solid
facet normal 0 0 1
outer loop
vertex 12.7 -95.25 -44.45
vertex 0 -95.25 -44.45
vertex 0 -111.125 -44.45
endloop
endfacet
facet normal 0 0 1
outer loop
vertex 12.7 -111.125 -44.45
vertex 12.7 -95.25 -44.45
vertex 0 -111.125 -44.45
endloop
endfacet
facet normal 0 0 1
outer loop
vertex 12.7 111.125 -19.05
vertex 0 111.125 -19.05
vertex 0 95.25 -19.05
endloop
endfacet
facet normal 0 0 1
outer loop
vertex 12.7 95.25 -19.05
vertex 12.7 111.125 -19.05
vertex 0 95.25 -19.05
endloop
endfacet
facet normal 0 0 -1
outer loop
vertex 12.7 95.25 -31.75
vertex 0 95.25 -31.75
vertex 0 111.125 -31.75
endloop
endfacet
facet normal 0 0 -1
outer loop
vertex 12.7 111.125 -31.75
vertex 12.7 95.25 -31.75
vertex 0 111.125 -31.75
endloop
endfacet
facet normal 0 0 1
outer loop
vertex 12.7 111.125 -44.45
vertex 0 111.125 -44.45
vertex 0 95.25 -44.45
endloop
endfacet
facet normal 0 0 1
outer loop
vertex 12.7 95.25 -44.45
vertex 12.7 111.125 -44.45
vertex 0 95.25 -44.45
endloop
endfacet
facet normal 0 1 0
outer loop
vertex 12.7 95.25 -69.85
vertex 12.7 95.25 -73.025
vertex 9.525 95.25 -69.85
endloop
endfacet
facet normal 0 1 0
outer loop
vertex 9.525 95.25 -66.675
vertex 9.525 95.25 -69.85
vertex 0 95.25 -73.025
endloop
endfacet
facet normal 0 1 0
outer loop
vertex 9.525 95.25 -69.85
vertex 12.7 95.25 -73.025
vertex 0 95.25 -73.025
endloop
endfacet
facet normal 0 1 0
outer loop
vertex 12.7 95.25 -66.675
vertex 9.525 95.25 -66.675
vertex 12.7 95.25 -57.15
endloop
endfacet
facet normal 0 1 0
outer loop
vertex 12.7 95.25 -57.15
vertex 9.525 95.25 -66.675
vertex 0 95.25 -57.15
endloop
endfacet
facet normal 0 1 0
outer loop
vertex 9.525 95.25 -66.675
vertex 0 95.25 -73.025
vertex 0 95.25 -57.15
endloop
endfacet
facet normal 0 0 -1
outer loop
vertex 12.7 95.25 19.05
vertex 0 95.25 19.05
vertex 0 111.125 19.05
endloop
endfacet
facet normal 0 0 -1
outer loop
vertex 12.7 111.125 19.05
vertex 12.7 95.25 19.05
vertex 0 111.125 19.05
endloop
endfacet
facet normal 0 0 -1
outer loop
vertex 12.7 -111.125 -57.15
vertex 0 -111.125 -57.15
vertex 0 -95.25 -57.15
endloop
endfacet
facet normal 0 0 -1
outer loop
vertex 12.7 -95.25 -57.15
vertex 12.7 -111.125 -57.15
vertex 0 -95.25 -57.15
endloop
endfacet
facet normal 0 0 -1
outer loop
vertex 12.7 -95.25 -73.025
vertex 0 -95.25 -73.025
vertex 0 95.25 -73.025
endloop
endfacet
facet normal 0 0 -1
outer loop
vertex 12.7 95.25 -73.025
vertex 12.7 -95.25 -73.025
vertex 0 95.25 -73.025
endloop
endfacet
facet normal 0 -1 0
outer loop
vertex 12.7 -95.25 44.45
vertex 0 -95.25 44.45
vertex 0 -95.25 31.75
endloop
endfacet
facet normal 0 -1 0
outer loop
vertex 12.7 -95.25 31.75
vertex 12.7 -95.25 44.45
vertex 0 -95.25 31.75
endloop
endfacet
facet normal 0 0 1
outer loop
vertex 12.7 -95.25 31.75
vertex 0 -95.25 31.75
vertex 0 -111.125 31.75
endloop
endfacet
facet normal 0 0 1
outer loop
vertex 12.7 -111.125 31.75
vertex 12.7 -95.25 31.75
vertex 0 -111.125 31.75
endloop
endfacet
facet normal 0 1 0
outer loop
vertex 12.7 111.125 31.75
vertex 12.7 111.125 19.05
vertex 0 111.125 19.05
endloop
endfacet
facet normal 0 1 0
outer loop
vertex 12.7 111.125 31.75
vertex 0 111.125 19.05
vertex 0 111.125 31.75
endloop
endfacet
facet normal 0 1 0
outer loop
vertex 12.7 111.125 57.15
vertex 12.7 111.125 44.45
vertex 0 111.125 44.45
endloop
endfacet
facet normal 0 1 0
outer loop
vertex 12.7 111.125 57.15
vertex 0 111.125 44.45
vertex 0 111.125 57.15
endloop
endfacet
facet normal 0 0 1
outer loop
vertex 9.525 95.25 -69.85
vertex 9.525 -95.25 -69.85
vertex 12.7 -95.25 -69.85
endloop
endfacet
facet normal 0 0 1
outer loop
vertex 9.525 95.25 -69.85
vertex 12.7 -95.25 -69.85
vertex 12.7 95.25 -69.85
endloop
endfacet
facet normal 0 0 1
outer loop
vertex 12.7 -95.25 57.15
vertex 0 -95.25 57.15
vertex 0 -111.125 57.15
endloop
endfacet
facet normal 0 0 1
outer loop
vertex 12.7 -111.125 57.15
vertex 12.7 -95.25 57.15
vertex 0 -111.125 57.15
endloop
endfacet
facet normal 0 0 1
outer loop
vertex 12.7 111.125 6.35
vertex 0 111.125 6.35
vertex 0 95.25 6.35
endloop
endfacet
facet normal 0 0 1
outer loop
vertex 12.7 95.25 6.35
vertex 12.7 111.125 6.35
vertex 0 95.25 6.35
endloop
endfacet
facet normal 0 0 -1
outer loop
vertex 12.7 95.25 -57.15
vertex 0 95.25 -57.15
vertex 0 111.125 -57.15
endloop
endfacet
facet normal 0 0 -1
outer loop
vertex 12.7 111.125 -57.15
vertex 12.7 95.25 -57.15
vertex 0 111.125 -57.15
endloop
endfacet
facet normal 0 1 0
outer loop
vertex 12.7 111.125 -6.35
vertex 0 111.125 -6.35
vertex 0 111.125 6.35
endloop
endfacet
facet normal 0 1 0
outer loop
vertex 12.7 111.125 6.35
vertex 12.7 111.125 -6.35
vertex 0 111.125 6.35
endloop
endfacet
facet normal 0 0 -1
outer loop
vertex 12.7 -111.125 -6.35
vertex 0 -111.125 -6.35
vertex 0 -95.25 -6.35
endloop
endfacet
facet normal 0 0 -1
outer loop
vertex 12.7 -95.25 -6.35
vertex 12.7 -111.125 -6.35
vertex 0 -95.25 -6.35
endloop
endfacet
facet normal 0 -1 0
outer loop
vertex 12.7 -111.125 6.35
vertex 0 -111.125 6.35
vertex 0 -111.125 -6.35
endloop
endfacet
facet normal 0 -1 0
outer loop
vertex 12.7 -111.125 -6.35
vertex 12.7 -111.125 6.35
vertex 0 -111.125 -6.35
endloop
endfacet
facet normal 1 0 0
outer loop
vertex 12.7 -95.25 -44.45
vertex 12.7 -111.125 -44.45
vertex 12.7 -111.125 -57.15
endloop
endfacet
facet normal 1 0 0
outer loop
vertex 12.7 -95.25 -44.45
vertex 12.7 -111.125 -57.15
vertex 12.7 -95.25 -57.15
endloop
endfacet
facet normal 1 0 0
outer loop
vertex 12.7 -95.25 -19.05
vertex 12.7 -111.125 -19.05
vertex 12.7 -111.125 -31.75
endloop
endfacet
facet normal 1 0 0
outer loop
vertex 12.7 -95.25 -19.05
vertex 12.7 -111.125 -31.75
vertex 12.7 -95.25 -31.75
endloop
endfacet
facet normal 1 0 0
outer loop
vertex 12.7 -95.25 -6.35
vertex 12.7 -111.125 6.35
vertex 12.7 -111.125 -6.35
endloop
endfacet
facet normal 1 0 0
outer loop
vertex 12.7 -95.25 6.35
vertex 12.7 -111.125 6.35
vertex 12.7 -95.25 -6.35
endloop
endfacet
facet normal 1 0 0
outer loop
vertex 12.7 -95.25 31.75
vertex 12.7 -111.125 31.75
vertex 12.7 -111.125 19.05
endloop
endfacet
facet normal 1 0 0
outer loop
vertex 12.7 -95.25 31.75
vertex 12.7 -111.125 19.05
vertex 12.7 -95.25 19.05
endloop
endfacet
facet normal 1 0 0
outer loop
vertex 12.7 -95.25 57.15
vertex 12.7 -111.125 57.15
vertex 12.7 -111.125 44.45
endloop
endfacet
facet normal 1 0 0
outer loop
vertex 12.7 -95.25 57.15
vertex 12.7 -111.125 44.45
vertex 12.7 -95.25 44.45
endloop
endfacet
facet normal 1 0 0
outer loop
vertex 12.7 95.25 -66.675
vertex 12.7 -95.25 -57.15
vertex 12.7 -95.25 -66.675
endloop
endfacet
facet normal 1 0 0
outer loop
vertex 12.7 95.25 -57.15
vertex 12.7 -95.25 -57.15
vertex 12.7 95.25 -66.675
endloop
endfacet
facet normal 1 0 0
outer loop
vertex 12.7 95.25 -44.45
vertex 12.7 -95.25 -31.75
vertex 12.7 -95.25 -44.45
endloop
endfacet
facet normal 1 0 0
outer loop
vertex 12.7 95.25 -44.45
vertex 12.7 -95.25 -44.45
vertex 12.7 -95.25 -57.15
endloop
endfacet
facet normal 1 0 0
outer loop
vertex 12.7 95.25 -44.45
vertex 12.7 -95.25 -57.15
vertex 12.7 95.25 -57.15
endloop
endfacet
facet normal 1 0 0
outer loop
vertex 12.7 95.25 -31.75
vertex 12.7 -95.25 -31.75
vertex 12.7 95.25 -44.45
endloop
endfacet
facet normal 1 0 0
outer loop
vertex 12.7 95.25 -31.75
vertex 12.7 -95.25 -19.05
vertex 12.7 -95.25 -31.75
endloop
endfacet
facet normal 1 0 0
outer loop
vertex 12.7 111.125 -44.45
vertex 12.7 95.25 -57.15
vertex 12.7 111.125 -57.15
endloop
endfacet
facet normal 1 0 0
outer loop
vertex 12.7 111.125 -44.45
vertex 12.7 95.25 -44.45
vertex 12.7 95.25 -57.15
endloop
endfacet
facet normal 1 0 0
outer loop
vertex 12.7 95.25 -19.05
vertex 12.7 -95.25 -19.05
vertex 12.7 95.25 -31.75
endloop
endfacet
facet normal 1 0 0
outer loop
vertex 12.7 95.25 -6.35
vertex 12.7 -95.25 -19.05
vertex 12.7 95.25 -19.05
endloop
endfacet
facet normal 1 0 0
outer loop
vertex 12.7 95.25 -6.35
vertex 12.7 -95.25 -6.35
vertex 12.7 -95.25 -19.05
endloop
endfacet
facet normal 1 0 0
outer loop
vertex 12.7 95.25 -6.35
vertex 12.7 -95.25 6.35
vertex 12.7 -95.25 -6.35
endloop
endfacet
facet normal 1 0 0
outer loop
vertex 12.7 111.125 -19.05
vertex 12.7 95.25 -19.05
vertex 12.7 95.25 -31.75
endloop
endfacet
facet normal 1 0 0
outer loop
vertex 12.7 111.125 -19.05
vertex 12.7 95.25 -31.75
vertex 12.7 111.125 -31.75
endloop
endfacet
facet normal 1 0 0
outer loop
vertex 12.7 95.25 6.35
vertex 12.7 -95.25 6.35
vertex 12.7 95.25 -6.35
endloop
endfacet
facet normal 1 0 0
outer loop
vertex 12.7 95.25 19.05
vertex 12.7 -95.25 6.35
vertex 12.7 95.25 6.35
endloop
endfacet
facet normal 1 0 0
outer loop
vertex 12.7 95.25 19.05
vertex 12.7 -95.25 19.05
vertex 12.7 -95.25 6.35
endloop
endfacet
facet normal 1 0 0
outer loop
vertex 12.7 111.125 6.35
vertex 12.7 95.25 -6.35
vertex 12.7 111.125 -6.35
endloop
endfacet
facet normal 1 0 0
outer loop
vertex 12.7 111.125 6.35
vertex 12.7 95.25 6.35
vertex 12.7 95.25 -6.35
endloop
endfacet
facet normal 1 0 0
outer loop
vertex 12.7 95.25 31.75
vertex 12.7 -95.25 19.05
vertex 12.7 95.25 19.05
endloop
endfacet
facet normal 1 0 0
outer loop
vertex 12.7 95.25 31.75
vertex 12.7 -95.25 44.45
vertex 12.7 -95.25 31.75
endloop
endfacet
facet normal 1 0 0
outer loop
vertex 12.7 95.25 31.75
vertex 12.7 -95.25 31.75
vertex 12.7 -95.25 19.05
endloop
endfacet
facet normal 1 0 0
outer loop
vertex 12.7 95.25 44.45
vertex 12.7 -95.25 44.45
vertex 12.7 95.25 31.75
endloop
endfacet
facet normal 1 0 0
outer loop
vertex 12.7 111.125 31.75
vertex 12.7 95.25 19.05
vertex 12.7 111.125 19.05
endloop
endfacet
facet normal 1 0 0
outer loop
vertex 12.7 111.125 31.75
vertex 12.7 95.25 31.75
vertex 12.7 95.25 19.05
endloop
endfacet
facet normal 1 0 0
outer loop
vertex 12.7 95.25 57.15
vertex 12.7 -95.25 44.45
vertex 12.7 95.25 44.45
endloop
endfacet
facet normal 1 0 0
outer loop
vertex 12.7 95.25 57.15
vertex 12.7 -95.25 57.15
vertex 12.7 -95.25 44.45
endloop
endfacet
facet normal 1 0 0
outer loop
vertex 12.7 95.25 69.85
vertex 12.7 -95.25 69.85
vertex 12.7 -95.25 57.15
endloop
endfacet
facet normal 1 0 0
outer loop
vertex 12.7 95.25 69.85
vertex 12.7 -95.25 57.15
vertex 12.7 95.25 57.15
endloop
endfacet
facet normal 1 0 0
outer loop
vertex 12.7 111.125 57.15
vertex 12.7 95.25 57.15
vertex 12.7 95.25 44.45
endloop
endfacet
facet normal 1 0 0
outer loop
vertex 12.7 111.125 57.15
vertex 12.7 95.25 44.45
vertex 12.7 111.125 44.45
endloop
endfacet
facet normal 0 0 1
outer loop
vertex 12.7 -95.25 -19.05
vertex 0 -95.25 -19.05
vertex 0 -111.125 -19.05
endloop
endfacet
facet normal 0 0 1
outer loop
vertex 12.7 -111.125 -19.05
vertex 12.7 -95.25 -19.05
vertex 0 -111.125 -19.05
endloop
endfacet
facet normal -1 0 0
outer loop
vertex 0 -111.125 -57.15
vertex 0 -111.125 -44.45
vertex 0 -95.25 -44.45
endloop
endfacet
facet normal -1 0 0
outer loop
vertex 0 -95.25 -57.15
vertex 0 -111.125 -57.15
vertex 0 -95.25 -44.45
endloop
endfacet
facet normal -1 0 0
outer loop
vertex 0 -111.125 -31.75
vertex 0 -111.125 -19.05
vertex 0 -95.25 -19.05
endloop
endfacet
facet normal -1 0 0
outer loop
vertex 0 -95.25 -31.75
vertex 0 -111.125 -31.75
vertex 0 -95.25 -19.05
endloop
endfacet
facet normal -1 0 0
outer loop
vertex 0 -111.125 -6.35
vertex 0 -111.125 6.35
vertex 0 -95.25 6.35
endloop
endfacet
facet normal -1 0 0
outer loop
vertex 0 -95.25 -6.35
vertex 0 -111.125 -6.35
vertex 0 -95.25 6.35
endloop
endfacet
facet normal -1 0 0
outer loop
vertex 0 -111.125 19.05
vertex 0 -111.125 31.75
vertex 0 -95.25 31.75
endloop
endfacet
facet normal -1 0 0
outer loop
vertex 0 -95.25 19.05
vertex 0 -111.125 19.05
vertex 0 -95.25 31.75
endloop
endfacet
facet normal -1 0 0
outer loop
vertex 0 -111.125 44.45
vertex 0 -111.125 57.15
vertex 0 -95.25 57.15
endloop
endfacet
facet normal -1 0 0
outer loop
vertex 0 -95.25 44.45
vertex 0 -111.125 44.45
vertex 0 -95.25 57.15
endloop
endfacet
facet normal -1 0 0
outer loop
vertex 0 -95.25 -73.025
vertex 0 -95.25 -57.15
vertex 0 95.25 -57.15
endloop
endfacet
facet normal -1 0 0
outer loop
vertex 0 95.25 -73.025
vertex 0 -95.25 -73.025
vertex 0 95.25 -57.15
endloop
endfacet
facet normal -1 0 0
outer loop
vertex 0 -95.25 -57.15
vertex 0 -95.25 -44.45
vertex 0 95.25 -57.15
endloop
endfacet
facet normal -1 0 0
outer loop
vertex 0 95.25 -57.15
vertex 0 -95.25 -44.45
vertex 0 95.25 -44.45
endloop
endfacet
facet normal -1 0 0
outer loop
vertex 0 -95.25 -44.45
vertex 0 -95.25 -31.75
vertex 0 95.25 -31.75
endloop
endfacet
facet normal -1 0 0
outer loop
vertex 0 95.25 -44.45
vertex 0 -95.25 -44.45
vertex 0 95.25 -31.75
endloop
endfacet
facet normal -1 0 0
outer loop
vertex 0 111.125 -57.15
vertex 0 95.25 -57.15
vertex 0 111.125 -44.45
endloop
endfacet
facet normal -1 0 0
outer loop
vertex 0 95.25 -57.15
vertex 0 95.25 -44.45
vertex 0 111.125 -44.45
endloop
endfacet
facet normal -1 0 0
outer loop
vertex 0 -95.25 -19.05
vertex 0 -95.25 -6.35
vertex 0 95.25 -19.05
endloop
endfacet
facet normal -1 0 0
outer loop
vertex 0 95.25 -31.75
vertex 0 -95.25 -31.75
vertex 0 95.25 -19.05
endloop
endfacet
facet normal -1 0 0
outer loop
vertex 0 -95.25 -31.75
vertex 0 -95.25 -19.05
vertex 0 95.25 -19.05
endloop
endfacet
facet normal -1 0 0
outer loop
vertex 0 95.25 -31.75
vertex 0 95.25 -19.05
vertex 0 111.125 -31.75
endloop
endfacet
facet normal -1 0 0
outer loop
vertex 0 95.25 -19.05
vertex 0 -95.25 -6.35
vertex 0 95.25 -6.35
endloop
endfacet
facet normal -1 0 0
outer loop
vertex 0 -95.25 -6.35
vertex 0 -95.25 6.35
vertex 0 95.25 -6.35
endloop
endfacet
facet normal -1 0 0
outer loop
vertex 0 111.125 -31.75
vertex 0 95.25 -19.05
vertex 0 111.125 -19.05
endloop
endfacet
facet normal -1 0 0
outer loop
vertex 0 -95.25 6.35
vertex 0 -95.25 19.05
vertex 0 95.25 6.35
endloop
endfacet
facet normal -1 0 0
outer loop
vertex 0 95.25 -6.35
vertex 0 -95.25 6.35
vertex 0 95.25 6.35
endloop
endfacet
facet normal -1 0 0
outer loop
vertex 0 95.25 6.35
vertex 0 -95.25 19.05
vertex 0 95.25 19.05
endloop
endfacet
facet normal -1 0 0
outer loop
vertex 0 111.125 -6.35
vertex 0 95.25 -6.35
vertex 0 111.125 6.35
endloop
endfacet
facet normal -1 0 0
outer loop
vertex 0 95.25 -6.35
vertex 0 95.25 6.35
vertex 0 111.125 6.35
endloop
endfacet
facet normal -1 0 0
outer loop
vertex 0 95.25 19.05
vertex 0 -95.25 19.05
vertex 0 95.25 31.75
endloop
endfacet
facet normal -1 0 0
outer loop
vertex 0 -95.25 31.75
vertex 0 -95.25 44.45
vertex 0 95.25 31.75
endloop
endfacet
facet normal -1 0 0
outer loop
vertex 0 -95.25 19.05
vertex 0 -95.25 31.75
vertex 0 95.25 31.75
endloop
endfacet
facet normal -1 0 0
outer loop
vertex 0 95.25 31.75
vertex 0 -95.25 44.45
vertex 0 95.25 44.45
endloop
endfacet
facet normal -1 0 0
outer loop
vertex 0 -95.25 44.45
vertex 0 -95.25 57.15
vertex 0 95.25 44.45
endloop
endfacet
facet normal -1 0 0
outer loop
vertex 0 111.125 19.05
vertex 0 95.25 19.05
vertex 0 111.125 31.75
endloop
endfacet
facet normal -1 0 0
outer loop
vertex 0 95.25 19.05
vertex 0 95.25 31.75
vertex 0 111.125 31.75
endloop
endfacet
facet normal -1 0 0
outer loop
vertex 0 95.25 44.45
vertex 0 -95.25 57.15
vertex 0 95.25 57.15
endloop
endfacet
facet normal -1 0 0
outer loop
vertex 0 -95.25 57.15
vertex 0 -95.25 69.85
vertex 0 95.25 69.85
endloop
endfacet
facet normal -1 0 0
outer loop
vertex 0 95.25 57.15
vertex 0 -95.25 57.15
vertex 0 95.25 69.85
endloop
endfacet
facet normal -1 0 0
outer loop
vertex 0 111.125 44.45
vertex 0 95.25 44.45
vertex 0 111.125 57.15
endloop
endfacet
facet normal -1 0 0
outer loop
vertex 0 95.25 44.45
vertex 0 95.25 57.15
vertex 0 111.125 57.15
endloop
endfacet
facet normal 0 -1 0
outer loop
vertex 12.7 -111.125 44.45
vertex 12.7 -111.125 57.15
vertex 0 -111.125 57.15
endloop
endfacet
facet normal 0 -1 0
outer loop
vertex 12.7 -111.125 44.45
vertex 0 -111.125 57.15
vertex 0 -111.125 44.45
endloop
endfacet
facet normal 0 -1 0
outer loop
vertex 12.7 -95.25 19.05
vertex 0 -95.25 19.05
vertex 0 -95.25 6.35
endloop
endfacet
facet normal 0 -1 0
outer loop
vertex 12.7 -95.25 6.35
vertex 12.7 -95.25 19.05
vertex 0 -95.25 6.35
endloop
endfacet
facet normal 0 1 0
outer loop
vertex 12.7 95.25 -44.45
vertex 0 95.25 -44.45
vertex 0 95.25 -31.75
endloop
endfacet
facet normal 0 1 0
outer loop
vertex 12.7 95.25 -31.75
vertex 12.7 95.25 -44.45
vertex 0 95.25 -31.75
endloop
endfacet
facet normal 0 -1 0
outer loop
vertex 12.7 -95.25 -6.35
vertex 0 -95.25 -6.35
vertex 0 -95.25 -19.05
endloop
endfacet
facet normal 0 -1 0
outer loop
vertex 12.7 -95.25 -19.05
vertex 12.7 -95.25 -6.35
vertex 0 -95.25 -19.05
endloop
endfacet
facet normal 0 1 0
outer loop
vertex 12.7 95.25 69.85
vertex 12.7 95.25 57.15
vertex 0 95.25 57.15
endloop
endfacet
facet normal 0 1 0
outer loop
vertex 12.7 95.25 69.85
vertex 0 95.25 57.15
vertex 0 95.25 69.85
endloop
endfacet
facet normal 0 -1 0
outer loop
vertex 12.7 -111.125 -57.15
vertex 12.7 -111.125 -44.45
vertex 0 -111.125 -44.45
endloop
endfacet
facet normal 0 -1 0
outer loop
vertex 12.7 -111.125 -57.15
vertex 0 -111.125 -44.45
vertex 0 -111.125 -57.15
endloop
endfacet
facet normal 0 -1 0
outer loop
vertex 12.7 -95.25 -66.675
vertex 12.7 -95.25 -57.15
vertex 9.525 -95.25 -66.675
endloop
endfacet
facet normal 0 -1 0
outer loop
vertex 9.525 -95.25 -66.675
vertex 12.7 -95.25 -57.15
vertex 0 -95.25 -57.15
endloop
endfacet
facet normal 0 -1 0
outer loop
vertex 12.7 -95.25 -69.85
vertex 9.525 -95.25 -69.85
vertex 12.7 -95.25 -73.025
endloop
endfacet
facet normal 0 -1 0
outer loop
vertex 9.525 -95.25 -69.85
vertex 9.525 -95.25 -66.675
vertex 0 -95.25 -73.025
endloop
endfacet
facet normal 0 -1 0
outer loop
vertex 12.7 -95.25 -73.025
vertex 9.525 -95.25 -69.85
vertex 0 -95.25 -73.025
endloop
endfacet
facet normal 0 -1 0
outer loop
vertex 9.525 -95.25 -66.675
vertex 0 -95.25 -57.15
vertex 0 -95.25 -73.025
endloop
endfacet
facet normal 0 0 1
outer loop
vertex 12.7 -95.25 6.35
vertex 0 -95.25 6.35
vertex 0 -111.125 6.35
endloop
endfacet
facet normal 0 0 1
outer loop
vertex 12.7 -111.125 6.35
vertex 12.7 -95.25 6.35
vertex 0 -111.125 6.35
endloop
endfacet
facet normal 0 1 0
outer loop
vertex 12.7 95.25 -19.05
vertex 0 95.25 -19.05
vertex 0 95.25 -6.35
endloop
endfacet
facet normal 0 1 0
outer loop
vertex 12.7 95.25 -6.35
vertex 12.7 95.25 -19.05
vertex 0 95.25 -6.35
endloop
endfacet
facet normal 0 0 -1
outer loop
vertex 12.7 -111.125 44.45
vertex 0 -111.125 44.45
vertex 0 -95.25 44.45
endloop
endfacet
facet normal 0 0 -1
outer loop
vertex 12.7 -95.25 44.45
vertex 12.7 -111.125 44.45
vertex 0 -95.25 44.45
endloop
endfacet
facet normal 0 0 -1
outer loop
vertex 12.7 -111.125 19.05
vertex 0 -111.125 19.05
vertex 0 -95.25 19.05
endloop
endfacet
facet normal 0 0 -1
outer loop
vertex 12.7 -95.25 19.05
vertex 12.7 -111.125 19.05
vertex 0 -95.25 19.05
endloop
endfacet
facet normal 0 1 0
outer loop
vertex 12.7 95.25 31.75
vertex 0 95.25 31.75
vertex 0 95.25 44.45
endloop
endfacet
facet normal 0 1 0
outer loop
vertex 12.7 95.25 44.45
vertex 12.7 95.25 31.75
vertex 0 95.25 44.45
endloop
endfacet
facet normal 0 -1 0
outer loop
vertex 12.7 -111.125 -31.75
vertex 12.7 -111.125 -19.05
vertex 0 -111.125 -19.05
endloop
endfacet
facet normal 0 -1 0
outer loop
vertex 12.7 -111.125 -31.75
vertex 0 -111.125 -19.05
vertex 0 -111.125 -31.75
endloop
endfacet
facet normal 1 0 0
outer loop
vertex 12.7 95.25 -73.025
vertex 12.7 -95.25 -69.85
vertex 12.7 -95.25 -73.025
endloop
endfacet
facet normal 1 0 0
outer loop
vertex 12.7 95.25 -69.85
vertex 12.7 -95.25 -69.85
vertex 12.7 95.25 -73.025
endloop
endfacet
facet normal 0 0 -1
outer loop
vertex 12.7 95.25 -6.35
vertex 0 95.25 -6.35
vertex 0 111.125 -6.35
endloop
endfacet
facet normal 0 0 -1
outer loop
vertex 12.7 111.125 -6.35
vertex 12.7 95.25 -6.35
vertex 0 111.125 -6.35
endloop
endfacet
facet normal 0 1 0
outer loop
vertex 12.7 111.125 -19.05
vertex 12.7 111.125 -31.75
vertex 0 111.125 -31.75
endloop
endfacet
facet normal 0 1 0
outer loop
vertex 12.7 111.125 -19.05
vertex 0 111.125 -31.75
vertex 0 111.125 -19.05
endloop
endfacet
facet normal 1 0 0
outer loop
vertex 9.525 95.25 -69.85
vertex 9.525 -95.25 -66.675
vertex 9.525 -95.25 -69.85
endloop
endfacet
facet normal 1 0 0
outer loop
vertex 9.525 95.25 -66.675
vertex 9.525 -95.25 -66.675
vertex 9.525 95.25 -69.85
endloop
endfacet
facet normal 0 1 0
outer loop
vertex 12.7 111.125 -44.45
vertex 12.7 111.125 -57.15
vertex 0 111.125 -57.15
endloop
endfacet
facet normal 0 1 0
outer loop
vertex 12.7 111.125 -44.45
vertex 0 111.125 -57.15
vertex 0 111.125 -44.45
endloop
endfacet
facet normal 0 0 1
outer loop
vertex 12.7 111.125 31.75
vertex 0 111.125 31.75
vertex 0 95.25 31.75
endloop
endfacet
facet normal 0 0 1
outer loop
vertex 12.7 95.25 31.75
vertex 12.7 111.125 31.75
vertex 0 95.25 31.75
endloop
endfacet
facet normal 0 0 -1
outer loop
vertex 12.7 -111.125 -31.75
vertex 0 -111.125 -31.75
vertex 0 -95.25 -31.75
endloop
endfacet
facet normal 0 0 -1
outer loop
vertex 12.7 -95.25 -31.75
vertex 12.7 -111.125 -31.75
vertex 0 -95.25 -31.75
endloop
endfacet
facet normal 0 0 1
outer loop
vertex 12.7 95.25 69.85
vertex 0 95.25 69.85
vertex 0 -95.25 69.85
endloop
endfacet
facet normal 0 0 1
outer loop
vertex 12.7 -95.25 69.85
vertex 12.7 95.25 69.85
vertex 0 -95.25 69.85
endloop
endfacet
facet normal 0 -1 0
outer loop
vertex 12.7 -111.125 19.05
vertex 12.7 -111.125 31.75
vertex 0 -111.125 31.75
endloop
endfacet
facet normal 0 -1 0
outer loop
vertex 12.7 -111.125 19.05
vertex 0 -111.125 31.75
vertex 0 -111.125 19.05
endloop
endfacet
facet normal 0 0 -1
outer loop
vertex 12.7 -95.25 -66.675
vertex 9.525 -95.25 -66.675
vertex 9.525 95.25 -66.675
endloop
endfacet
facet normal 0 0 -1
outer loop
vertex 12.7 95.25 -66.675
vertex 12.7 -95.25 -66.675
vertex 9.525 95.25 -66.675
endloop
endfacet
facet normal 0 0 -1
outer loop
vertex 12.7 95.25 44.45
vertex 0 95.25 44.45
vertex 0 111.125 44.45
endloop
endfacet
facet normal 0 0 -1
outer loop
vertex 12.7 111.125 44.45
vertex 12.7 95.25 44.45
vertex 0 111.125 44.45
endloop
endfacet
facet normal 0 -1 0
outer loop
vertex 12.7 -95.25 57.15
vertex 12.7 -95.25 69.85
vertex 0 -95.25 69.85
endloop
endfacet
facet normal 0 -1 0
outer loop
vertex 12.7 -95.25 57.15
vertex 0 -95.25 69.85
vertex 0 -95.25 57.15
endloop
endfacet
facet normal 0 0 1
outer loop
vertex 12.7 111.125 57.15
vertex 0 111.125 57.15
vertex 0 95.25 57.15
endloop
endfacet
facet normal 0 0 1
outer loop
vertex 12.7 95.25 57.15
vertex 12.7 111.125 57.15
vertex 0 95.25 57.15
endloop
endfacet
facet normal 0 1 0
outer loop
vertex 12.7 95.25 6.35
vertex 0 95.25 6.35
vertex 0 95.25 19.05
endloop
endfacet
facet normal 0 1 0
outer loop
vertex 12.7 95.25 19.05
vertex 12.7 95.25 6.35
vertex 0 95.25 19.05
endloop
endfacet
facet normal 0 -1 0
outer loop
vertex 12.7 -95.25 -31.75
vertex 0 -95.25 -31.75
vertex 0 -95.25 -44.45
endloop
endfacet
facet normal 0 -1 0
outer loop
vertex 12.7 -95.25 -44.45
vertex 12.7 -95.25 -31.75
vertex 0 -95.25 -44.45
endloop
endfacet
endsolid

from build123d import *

# Parameters (mm, degrees)
F0_W     = 190.5
F0_H     = 3.175
F1_DEPTH = 9.525
F2_DEPTH = 12.7


with BuildPart() as f1:
    # F0 (on Right) → F1 (new body)
    with BuildSketch(Plane.YZ):
        with Locations((0, -68.2625)):
            Rectangle(F0_W, F0_H)
    extrude(amount=F1_DEPTH)

    # F0 (on Right) → F2 (join)
    with BuildSketch(Plane.YZ):
        Polygon((-95.25, -57.15), (-95.25, -66.675), (95.25, -66.675), (95.25, -57.15), (111.125, -57.15), (111.125, -44.45), (95.25, -44.45), (95.25, -31.75), (111.125, -31.75), (111.125, -19.05), (95.25, -19.05), (95.25, -6.35), (111.125, -6.35), (111.125, 6.35), (95.25, 6.35), (95.25, 19.05), (111.125, 19.05), (111.125, 31.75), (95.25, 31.75), (95.25, 44.45), (111.125, 44.45), (111.125, 57.15), (95.25, 57.15), (95.25, 69.85), (-95.25, 69.85), (-95.25, 57.15), (-111.125, 57.15), (-111.125, 44.45), (-95.25, 44.45), (-95.25, 31.75), (-111.125, 31.75), (-111.125, 19.05), (-95.25, 19.05), (-95.25, 6.35), (-111.125, 6.35), (-111.125, -6.35), (-95.25, -6.35), (-95.25, -19.05), (-111.125, -19.05), (-111.125, -31.75), (-95.25, -31.75), (-95.25, -44.45), (-111.125, -44.45), (-111.125, -57.15), align=None)
        with Locations((0, -71.4375)):
            Rectangle(F0_W, F0_H)
    extrude(amount=F2_DEPTH)


solid = f1.part
